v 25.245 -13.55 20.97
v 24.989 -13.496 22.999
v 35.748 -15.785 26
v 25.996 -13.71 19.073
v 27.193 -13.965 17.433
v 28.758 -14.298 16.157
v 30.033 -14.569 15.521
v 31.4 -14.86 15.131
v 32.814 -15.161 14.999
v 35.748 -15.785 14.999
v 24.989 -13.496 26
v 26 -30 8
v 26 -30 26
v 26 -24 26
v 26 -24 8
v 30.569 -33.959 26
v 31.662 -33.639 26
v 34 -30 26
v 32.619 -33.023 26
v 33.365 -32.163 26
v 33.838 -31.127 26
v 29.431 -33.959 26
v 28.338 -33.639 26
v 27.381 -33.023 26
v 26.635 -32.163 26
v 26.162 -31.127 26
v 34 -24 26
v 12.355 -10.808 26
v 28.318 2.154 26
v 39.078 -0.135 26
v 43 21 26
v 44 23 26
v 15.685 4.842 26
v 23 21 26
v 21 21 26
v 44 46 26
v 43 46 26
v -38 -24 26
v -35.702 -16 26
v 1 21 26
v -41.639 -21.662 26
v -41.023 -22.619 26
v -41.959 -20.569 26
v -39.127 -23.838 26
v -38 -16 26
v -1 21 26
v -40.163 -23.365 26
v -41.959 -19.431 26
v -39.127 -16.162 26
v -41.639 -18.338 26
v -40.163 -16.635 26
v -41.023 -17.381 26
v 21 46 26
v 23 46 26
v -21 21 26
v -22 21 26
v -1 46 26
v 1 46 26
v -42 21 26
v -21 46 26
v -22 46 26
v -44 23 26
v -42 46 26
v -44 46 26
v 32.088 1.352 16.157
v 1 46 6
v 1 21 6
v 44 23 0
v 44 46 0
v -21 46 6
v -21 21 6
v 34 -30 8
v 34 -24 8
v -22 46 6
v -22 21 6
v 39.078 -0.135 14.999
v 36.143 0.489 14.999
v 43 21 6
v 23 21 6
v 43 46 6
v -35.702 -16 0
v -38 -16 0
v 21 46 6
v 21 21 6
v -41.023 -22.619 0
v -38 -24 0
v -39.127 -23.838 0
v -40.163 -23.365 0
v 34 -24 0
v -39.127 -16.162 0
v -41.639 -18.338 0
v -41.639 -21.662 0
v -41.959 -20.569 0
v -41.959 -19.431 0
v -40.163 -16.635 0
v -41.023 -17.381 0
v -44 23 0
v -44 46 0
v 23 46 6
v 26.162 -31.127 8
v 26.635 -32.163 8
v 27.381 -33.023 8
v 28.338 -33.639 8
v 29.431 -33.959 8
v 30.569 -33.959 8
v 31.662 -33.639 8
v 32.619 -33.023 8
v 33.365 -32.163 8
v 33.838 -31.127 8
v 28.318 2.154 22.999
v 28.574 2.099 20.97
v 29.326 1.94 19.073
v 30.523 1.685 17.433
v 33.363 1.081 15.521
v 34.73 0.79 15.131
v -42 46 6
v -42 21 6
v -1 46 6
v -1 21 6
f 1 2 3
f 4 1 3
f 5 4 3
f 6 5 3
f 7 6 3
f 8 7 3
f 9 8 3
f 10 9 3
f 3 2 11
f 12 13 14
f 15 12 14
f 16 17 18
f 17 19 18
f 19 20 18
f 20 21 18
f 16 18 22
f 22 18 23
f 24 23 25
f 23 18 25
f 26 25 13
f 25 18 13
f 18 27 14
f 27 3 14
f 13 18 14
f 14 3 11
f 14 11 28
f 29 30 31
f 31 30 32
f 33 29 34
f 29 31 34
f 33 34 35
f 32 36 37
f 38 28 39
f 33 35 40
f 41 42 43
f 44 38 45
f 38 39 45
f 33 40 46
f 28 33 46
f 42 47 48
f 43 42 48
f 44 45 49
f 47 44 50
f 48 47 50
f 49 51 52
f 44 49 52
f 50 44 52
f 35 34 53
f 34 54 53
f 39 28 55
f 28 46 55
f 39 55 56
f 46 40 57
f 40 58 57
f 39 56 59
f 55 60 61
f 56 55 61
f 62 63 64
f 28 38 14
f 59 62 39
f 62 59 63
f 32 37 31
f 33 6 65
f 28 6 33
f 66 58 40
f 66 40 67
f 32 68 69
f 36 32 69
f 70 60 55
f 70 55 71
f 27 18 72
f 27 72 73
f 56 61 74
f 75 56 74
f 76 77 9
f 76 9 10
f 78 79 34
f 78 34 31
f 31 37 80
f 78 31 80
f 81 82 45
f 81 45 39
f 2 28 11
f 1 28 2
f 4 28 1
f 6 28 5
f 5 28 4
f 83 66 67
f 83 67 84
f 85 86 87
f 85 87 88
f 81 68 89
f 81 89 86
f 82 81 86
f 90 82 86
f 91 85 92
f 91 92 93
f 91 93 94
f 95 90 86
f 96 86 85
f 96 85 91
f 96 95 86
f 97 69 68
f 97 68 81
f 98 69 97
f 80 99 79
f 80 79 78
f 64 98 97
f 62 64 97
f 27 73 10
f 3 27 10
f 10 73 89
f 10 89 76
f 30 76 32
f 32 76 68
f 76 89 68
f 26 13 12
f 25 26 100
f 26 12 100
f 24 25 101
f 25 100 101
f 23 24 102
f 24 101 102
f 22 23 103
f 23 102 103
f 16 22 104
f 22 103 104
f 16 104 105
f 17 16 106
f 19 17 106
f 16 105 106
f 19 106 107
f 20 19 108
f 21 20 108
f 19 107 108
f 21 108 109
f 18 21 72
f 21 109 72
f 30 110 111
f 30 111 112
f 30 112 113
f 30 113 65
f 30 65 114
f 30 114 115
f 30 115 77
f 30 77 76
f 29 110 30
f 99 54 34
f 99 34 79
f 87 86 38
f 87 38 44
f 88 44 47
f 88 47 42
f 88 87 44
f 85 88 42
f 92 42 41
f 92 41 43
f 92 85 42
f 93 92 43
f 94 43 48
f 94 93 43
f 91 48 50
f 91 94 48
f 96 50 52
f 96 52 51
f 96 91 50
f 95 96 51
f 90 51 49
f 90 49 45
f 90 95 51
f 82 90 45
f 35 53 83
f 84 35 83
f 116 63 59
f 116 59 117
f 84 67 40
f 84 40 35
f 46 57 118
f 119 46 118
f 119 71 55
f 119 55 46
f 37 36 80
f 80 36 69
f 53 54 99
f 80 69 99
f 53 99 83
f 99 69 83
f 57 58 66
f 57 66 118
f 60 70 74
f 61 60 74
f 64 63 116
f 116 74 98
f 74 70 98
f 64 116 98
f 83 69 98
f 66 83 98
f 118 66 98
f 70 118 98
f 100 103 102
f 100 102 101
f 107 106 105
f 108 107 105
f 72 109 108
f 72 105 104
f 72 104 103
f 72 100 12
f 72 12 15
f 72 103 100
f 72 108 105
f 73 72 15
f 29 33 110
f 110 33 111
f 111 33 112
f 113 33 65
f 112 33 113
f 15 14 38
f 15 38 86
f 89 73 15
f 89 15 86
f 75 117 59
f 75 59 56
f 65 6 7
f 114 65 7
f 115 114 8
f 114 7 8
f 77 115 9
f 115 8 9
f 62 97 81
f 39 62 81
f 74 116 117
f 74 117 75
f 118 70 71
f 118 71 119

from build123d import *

# Parameters (mm, degrees)
EXTRUDE_1_DEPTH      = 26
SKETCH_4_W           = 20
SKETCH_4_H           = 20
CUT_EXTRUDE_5_DEPTH  = 25
CUT_EXTRUDE_6_DEPTH  = 8
CUT_EXTRUDE_8_DEPTH  = 16
SKETCH_12_W          = 8
SKETCH_12_H          = 10
EXTRUDE_2_DEPTH      = 26
CUT_EXTRUDE_9_DEPTH  = 26
SKETCH_14_W          = 8
SKETCH_14_H          = 12.86312638
CUT_EXTRUDE_10_DEPTH = 95.212525707


with BuildPart() as part:
    # 草图1 → 凸台-拉伸1 (new body)
    with BuildSketch(Plane.XY):
        Polygon((-34, -24), (34, -24), (44, 23), (44, 46), (-44, 46), (-44, 23), align=None)
    extrude(amount=EXTRUDE_1_DEPTH)

    # 草图4 → 切除-拉伸5 (cut)
    with BuildSketch(Plane(origin=(0, 46, 0), x_dir=(1, 0, 0), z_dir=(0, 1, 0))):
        with Locations((33, -16)):
            Rectangle(SKETCH_4_W, SKETCH_4_H)
        with Locations((11, -16)):
            Rectangle(SKETCH_4_W, SKETCH_4_H)
        with Locations((-11, -16)):
            Rectangle(SKETCH_4_W, SKETCH_4_H)
        with Locations((-32, -16)):
            Rectangle(SKETCH_4_W, SKETCH_4_H)
    extrude(amount=-CUT_EXTRUDE_5_DEPTH, mode=Mode.SUBTRACT)

    # Sketch 3D_6 → 切除-拉伸6 (cut, symmetric)
    with BuildSketch(Plane(origin=(34.478414998, -7.335832978, 14.99907516), x_dir=(0.5895982688198705, -0.12544644017993214, 0.7978954016979886), z_dir=(-0.20810764446495697, -0.9781059289848145, -6.6559639472978385e-12))):
        with BuildLine():
            Line((0, 0), (6.376045072, -8.439700449))
            Line((6.376045072, -8.439700449), (17.547318622, 0))
            Line((17.547318622, 0), (11.17127355, 8.439700449))
            Line((11.17127355, 8.439700449), (6.348906145, 14.822863662))
            Line((6.348906145, 14.822863662), (1.560795809, 11.205530619))
            ThreePointArc((1.560795809, 11.205530619), (-1.540343474, 5.926016705), (0, 0))
        make_face()
    extrude(amount=CUT_EXTRUDE_6_DEPTH, both=True, mode=Mode.SUBTRACT)

    # 草图11 → 切除-拉伸8 (cut)
    with BuildSketch(Plane(origin=(-1.664861156, -7.824847432, 0), x_dir=(0.9781059289845859, -0.2081076444660318, -1.1269708570671002e-12), z_dir=(0.20810764446603178, 0.9781059289845858, 5.296763028184159e-12))):
        with BuildLine():
            Line((31.200844283, -16.100518909), (14.333584528, -26))
            Line((14.333584528, -26), (32.666556858, -30.571318601))
            ThreePointArc((32.666556858, -30.571318601), (42.196349228, -26.968728166), (40.460809076, -16.92962956))
            Line((40.460809076, -16.92962956), (38.250185053, -14.99907516))
            Line((38.250185053, -14.99907516), (35.250185053, -15))
            ThreePointArc((35.250185053, -15), (33.152072655, -15.280030806), (31.200844283, -16.100518909))
        make_face()
    extrude(amount=CUT_EXTRUDE_8_DEPTH, mode=Mode.SUBTRACT)

    # 草图12 → 凸台-拉伸2 (add)
    with BuildSketch(Plane(origin=(0, 0, 0), x_dir=(-1, 0, 0), z_dir=(0, 0, -1))):
        with Locations((-30, -29)):
            Rectangle(SKETCH_12_W, SKETCH_12_H)
        with BuildLine():
            Line((34, -24), (38, -24))
            ThreePointArc((38, -24), (42, -20), (38, -16))
            Line((38, -16), (34, -16))
            Line((34, -16), (34, -24))
        make_face()
    extrude(amount=-EXTRUDE_2_DEPTH)

    # 草图13 → 切除-拉伸9 (cut)
    with BuildSketch(Plane(origin=(0, 0, 0), x_dir=(-1, 0, 0), z_dir=(0, 0, -1))):
        with BuildLine():
            Line((-34, -30), (-34, -35.772176756))
            Line((-34, -35.772176756), (-26, -35.772176756))
            Line((-26, -35.772176756), (-26, -30))
            ThreePointArc((-26, -30), (-30, -34), (-34, -30))
        make_face()
        with BuildLine():
            Line((26, -30), (26, -35.772176756))
            Line((26, -35.772176756), (34, -35.772176756))
            Line((34, -35.772176756), (34, -30))
            ThreePointArc((34, -30), (30, -34), (26, -30))
        make_face()
    extrude(amount=-CUT_EXTRUDE_9_DEPTH, mode=Mode.SUBTRACT)

    # 草图14 → 切除-拉伸10 (cut, through all)
    with BuildSketch(Plane(origin=(34, 0, 0), x_dir=(0, 0, -1), z_dir=(1, 0, 0))):
        with Locations((-4, -30.43156319)):
            Rectangle(SKETCH_14_W, SKETCH_14_H)
    extrude(amount=-CUT_EXTRUDE_10_DEPTH, mode=Mode.SUBTRACT)


solid = part.part
